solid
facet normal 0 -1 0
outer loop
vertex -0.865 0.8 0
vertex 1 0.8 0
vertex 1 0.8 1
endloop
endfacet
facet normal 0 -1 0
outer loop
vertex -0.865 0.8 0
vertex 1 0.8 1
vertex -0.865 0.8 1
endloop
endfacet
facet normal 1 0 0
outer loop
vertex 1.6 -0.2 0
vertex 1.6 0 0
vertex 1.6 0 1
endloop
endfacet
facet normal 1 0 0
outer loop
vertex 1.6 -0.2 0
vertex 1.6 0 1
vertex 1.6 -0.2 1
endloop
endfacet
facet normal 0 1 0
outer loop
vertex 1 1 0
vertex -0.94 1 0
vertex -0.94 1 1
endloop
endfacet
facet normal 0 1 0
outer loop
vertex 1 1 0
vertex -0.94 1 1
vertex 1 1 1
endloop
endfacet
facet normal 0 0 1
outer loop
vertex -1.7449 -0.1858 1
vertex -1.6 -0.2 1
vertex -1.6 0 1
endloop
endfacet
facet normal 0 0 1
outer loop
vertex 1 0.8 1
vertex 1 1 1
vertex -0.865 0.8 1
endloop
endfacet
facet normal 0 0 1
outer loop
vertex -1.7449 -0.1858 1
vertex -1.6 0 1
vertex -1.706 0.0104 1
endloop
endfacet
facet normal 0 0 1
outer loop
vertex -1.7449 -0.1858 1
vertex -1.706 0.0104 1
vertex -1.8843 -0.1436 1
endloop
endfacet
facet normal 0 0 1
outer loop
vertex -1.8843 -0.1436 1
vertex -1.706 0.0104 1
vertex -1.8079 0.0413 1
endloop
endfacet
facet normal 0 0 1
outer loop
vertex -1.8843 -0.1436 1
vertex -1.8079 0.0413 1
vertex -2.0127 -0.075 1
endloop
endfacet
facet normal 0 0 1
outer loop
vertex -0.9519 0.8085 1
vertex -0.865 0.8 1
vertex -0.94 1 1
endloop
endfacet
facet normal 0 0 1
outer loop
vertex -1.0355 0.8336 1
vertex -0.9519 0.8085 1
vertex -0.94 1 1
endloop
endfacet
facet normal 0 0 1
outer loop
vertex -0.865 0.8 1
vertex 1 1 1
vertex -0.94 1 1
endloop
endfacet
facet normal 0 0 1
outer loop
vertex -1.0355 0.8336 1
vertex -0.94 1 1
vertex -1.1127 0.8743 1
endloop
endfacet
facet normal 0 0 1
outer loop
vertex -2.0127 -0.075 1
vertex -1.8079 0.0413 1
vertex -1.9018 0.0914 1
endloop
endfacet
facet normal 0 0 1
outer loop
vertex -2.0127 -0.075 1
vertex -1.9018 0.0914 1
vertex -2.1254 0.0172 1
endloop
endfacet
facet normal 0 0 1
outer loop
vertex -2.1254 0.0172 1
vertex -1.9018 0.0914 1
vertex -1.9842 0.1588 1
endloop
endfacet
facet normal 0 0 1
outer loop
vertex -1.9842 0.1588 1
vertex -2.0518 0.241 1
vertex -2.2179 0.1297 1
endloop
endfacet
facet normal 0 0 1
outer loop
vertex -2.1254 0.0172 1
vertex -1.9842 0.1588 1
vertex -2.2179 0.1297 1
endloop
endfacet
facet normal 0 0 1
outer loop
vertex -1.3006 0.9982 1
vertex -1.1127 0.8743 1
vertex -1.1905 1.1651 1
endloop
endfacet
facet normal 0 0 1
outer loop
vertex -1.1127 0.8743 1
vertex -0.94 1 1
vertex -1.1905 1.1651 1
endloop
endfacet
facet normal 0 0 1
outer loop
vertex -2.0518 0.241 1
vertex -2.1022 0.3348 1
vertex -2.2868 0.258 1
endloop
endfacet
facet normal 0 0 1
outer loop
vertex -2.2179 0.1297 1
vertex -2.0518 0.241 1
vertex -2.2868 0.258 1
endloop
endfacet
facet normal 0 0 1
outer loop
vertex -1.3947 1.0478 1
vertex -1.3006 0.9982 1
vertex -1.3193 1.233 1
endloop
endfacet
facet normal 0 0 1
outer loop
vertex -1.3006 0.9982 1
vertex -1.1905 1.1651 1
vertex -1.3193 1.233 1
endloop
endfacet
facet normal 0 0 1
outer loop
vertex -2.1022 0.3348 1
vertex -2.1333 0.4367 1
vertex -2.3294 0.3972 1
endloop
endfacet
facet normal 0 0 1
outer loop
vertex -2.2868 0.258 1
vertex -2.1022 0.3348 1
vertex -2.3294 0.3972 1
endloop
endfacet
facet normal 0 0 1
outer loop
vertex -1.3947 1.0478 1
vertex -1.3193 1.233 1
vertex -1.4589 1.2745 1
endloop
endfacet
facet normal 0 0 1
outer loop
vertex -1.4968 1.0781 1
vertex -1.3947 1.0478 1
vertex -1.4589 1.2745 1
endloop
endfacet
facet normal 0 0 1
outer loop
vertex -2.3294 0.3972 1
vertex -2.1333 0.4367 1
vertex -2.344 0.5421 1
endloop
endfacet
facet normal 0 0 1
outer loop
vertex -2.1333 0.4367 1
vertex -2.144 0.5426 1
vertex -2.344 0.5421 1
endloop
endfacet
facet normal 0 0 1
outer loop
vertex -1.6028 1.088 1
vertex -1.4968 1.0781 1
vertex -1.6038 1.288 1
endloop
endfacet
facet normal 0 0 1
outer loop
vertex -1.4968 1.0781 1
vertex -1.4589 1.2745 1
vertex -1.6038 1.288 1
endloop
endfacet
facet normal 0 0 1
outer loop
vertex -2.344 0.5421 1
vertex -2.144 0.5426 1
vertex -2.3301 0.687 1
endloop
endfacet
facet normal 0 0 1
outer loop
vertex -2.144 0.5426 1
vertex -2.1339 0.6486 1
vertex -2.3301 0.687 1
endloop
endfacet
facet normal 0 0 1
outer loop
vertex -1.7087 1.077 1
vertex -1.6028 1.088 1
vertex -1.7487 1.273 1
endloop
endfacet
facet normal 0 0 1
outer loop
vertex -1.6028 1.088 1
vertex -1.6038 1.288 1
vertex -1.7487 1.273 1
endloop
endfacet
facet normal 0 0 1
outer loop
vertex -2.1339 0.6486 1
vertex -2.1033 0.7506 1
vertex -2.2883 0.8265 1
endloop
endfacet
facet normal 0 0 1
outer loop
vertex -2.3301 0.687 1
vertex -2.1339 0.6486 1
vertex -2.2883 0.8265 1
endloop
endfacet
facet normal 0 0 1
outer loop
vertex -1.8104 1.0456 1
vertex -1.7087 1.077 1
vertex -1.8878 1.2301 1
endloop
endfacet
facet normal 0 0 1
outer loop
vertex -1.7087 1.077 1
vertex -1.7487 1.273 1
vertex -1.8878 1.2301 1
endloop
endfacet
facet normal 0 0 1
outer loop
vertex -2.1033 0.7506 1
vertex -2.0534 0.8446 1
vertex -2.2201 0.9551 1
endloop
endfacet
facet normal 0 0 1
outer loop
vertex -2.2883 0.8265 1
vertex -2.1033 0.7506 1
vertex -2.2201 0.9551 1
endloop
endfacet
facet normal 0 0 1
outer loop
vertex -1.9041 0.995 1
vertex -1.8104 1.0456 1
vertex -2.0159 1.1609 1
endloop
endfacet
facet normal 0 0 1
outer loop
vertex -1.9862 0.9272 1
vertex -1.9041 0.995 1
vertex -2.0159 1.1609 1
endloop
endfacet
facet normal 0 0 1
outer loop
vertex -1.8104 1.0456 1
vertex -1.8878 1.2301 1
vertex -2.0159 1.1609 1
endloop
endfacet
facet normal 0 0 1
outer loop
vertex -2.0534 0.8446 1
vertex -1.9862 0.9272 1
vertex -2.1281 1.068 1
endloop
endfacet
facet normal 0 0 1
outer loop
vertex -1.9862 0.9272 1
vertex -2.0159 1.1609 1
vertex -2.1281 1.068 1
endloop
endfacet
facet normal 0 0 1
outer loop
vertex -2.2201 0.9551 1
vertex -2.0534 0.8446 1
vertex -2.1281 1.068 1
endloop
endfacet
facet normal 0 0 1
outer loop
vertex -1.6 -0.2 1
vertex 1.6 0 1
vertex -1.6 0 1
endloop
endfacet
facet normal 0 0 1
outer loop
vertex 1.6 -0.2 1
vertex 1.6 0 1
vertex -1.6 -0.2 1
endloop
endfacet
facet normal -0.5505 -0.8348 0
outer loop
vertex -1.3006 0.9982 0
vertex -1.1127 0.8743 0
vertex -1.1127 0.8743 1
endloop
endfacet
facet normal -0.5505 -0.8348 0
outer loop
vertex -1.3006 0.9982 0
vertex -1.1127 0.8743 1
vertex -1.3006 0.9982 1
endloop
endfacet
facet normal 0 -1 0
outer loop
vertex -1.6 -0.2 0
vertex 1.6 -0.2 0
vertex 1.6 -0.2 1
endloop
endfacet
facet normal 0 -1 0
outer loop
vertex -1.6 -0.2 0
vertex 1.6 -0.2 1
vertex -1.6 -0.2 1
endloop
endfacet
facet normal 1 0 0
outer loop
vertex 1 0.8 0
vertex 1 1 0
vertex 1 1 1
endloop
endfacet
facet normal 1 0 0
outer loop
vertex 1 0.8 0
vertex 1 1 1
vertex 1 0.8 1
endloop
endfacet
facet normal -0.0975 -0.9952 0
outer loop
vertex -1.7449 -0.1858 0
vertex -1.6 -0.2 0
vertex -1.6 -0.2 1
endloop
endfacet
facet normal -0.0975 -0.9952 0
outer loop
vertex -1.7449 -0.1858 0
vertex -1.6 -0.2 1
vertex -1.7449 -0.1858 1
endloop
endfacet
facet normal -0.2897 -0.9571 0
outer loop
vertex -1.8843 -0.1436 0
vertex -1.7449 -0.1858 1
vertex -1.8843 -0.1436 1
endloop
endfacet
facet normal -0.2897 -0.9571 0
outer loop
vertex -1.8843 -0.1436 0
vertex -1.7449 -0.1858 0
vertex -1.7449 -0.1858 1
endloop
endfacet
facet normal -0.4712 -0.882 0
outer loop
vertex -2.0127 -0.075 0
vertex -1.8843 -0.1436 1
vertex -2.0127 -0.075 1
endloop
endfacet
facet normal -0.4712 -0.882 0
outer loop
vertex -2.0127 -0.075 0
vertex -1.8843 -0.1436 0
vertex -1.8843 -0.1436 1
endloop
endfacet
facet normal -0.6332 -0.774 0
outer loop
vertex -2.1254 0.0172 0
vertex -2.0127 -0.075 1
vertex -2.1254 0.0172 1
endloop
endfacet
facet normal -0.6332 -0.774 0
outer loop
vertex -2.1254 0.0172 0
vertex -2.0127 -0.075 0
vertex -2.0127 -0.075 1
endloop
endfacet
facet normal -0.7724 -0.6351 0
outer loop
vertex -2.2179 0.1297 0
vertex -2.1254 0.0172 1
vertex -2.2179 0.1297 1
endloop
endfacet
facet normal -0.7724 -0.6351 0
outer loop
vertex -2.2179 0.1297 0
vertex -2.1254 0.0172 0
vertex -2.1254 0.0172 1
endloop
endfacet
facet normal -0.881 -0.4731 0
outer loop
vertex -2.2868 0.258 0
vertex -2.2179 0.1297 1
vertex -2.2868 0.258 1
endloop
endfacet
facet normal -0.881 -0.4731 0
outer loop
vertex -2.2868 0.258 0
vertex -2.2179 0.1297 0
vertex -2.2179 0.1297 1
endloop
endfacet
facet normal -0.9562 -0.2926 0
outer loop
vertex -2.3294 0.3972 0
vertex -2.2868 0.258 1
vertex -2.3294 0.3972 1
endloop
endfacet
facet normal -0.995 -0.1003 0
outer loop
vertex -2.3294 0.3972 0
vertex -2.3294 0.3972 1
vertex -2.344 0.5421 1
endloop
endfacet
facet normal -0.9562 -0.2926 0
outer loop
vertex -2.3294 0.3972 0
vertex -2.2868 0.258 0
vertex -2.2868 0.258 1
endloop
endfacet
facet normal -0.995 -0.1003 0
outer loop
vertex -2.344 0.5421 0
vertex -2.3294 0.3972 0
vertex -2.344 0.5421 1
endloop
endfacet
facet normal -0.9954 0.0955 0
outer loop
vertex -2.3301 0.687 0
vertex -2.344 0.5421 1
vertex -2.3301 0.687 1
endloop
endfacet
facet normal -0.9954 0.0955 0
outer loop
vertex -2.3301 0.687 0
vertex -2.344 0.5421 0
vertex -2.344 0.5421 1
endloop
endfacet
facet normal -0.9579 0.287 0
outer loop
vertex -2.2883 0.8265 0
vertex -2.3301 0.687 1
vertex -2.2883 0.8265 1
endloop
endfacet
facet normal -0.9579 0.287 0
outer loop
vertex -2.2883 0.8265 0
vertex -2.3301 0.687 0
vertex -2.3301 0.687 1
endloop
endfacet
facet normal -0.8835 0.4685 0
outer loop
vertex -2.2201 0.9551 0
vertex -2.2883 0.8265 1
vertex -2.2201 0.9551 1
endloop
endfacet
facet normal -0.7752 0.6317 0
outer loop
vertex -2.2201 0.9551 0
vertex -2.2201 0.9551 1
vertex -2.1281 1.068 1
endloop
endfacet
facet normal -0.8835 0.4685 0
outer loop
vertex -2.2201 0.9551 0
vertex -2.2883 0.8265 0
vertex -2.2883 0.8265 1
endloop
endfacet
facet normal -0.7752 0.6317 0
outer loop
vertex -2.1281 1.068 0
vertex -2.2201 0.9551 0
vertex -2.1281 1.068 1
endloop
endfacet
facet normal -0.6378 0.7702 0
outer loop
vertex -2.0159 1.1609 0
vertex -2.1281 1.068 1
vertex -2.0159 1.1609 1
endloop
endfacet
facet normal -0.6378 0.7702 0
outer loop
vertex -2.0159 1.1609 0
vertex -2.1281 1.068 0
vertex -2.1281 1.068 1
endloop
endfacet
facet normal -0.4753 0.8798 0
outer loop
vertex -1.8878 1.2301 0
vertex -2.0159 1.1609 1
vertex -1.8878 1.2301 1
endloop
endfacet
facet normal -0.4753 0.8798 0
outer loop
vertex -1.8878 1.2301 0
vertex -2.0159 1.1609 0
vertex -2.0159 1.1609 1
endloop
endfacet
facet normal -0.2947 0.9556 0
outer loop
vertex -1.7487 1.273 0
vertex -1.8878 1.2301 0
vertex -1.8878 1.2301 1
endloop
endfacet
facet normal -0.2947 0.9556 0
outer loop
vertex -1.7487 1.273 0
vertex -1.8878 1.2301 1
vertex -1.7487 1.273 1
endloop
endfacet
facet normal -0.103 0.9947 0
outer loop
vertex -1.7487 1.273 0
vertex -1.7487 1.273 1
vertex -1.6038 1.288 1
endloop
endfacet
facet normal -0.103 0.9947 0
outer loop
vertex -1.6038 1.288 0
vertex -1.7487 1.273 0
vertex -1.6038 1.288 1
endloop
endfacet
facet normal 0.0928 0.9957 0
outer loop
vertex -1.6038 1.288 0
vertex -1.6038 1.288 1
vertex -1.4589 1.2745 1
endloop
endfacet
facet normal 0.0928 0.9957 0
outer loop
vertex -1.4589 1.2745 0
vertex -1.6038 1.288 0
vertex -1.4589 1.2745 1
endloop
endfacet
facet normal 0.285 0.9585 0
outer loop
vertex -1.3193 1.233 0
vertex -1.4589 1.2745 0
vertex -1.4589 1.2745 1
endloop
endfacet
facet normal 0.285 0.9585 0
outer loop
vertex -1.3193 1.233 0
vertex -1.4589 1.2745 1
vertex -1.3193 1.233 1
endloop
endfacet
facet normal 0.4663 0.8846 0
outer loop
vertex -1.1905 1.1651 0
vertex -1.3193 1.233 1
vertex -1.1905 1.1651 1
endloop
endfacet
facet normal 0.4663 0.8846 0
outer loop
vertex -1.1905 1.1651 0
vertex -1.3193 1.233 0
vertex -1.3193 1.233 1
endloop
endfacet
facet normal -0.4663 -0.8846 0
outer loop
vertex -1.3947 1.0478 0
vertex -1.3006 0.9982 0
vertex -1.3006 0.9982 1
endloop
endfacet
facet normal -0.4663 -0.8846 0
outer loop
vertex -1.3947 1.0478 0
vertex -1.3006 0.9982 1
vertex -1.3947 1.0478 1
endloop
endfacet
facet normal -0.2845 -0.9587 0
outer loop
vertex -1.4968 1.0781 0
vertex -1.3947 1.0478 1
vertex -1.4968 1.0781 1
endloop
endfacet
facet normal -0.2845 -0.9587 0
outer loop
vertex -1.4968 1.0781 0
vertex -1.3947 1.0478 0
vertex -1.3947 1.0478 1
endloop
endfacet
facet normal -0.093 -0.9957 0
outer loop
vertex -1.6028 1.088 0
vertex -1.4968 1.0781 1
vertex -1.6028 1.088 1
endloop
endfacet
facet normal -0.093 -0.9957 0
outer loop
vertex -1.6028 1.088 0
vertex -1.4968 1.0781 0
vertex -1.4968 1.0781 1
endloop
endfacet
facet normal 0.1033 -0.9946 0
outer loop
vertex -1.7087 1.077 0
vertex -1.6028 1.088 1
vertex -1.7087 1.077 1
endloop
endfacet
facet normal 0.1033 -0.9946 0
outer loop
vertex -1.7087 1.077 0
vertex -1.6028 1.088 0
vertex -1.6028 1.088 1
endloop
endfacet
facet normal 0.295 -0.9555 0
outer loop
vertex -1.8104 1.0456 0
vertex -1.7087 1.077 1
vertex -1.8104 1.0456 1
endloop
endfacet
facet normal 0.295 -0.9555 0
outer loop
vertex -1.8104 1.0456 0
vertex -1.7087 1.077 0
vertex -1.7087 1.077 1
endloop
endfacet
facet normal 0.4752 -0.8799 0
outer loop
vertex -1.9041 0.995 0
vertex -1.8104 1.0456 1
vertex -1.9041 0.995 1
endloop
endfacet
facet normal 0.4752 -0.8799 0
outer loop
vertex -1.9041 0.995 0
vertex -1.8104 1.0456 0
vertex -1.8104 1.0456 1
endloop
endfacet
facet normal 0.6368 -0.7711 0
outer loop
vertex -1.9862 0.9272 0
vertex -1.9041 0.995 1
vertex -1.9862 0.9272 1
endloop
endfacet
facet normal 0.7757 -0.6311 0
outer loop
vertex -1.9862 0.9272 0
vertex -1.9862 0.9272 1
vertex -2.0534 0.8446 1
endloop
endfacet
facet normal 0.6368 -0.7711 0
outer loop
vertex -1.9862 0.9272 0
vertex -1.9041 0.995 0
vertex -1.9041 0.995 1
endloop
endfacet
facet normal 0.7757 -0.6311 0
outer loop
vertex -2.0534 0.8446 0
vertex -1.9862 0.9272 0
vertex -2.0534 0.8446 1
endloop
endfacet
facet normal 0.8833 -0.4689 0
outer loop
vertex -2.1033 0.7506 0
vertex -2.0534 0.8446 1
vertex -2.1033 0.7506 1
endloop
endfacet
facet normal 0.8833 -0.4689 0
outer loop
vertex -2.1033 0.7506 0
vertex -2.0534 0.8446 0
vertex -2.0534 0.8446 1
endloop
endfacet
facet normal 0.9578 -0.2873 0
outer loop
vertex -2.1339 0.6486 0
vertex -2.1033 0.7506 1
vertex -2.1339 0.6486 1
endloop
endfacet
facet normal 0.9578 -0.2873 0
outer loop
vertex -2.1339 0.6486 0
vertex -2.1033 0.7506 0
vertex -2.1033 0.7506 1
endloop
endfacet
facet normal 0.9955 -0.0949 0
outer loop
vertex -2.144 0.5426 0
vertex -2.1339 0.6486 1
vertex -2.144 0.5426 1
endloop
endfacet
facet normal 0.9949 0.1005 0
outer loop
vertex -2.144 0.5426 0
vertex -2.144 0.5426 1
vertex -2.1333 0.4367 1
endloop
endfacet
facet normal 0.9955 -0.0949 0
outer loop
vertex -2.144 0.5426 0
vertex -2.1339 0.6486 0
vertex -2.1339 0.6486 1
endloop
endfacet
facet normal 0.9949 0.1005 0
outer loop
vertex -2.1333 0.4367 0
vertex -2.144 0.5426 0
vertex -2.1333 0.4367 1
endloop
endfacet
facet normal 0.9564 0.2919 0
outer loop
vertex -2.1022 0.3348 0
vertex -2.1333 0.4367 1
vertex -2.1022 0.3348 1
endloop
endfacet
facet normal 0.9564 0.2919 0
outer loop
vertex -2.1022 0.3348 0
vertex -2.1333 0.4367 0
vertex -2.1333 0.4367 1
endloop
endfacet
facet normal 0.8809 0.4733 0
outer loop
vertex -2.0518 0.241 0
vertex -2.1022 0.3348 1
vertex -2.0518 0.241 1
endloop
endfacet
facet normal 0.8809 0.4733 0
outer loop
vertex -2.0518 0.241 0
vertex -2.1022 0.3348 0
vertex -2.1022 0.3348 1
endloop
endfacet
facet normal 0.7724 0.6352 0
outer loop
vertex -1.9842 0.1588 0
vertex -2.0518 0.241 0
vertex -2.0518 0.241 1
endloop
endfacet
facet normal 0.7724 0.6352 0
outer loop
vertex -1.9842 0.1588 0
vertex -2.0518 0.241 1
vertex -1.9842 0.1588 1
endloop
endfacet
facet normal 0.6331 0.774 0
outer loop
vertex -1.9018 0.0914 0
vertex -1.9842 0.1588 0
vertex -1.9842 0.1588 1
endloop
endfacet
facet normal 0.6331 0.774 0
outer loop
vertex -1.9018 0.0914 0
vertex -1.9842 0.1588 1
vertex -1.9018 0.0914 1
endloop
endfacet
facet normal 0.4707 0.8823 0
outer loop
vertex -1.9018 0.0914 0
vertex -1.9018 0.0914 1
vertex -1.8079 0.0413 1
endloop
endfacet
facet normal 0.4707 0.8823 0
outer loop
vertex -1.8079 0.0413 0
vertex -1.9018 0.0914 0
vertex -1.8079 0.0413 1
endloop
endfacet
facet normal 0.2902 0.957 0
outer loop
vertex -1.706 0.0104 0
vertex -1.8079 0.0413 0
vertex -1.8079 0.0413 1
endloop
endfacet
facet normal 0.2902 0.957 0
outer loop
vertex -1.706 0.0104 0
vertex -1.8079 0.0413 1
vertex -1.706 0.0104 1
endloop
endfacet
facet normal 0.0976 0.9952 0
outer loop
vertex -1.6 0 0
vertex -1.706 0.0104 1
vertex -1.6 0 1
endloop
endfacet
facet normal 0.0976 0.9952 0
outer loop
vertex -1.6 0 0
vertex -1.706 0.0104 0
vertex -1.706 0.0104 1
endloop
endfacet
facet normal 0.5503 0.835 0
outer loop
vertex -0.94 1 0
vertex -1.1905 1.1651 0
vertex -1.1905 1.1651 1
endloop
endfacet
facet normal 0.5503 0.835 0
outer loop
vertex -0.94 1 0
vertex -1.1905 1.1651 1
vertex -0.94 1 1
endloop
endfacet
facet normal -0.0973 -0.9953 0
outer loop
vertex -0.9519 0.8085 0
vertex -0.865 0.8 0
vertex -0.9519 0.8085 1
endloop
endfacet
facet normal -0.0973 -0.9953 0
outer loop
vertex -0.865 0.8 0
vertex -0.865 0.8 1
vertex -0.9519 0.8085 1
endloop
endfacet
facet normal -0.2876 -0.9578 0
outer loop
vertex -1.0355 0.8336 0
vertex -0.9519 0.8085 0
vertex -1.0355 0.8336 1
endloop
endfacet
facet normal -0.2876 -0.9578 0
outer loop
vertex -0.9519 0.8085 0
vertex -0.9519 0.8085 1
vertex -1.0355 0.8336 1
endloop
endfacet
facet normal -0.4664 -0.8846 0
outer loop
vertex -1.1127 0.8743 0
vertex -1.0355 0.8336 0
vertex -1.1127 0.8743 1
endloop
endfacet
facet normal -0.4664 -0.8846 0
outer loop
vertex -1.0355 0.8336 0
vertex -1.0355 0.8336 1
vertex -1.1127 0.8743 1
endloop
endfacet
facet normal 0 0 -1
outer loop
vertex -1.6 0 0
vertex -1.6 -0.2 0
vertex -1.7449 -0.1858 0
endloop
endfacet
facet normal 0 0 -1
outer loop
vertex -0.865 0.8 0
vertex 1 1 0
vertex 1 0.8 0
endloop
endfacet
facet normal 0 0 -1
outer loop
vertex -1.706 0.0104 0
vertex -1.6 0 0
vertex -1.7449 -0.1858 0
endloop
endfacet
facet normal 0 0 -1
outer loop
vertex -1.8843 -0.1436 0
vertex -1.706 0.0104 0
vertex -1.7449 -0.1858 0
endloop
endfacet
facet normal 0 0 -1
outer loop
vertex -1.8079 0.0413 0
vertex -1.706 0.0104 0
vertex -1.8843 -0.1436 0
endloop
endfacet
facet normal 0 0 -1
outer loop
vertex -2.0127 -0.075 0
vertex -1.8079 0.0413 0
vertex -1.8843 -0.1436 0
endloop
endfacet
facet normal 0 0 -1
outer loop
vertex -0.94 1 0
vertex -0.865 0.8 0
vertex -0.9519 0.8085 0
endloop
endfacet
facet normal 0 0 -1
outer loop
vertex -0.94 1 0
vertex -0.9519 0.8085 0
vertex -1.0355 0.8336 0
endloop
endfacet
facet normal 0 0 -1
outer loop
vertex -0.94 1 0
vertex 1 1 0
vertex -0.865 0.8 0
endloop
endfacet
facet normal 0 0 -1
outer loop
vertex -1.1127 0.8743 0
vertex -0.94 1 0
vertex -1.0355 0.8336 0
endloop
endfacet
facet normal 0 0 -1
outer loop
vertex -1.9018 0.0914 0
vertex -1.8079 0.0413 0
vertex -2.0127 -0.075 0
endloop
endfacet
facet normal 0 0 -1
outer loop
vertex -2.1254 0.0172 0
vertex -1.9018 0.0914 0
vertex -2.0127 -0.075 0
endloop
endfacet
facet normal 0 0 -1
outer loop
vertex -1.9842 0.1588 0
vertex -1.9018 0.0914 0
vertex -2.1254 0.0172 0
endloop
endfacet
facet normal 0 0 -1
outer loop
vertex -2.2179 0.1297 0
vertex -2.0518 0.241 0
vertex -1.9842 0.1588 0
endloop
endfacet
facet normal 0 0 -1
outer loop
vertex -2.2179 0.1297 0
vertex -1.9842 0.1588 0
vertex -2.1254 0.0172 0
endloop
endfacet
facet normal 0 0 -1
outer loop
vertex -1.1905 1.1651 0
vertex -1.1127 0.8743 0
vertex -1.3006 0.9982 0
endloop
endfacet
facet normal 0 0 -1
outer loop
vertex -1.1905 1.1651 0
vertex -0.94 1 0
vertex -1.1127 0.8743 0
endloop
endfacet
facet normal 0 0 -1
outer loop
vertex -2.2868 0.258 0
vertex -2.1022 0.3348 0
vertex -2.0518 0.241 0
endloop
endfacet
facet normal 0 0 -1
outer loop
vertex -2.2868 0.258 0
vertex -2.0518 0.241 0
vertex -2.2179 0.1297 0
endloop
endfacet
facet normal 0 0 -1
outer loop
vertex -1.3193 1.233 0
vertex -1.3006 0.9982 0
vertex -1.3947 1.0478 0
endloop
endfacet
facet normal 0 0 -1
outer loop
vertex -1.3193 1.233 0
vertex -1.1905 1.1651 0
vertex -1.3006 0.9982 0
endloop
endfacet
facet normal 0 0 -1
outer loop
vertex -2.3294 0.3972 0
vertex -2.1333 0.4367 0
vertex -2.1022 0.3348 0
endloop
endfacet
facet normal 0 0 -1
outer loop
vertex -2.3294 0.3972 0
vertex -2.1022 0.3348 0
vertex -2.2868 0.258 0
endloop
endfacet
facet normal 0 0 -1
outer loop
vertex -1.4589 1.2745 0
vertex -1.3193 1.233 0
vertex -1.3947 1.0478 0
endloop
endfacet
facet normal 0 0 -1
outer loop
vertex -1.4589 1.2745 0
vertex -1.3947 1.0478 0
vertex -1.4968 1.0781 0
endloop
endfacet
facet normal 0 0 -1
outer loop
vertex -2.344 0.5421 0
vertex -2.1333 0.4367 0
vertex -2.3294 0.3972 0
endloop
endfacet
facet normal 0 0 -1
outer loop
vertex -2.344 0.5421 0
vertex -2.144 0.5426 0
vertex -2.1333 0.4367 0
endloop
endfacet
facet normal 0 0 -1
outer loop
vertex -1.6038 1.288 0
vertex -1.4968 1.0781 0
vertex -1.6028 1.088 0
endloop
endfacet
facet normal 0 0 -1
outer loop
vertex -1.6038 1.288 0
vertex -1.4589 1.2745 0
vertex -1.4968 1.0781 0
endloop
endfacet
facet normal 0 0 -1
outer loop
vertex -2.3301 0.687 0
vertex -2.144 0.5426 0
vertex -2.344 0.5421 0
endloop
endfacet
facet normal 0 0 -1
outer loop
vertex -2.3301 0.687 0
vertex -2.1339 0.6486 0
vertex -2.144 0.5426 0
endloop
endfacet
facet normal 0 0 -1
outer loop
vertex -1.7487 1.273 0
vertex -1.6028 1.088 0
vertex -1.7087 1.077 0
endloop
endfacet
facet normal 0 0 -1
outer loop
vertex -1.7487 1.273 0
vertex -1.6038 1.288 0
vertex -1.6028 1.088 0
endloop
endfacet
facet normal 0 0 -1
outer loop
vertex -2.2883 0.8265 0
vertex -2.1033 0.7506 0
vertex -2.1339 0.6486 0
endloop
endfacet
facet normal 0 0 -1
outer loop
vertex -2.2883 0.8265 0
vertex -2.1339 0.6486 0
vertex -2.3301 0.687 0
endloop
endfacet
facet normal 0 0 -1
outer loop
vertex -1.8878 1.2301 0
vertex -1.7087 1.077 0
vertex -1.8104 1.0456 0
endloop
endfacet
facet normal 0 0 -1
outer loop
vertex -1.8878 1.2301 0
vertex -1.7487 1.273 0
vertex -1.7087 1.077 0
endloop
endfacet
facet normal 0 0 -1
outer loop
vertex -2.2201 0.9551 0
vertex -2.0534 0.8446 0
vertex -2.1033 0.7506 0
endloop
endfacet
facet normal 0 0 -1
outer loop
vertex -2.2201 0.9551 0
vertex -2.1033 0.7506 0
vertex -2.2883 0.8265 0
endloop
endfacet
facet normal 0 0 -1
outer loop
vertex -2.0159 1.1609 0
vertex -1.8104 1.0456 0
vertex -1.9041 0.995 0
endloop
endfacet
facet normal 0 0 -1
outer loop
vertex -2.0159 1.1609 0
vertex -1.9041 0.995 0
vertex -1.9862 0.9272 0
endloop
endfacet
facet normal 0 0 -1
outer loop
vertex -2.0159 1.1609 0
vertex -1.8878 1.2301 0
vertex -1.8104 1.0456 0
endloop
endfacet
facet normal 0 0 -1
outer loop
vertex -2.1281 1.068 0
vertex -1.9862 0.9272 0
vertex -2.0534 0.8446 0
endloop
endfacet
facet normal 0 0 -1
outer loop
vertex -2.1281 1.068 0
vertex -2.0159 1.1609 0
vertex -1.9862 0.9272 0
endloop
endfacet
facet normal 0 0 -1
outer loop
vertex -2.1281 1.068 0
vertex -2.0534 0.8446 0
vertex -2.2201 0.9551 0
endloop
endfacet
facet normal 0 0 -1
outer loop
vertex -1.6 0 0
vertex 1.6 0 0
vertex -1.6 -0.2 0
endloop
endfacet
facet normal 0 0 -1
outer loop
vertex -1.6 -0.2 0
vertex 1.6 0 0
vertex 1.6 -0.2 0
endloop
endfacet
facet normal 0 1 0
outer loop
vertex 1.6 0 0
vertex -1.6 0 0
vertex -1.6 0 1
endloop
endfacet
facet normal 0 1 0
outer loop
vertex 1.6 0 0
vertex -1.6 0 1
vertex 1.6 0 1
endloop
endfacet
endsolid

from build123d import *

# Parameters (mm, degrees)
BOSS_EXTRUDE1_DEPTH = 1
FILLET2_R           = 0.45


with BuildPart() as part:
    # Sketch1 → Boss-Extrude1 (new body)
    with BuildSketch(Plane.XY):
        with BuildLine():
            Line((-1.6, 0), (1.6, 0))
            Line((1.6, 0), (1.6, -0.2))
            Line((1.6, -0.2), (-1.6, -0.2))
            ThreePointArc((-1.6, -0.2), (-2.312622756, 0.757786827), (-1.190458716, 1.165137615))
            Line((-1.190458716, 1.165137615), (-0.94, 1))
            Line((-0.94, 1), (1, 1))
            Line((1, 1), (1, 0.8))
            Line((1, 0.8), (-1, 0.8))
            Line((-1, 0.8), (-1.300550459, 0.998165138))
            ThreePointArc((-1.300550459, 0.998165138), (-2.121057499, 0.70031725), (-1.6, 0))
        make_face()
    extrude(amount=BOSS_EXTRUDE1_DEPTH)

    # Fillet2
    fillet2_edges = [part.edges().sort_by_distance(p)[0] for p in [
        (-1, 0.8, 0.5),
    ]]
    fillet(fillet2_edges, radius=FILLET2_R)


solid = part.part
